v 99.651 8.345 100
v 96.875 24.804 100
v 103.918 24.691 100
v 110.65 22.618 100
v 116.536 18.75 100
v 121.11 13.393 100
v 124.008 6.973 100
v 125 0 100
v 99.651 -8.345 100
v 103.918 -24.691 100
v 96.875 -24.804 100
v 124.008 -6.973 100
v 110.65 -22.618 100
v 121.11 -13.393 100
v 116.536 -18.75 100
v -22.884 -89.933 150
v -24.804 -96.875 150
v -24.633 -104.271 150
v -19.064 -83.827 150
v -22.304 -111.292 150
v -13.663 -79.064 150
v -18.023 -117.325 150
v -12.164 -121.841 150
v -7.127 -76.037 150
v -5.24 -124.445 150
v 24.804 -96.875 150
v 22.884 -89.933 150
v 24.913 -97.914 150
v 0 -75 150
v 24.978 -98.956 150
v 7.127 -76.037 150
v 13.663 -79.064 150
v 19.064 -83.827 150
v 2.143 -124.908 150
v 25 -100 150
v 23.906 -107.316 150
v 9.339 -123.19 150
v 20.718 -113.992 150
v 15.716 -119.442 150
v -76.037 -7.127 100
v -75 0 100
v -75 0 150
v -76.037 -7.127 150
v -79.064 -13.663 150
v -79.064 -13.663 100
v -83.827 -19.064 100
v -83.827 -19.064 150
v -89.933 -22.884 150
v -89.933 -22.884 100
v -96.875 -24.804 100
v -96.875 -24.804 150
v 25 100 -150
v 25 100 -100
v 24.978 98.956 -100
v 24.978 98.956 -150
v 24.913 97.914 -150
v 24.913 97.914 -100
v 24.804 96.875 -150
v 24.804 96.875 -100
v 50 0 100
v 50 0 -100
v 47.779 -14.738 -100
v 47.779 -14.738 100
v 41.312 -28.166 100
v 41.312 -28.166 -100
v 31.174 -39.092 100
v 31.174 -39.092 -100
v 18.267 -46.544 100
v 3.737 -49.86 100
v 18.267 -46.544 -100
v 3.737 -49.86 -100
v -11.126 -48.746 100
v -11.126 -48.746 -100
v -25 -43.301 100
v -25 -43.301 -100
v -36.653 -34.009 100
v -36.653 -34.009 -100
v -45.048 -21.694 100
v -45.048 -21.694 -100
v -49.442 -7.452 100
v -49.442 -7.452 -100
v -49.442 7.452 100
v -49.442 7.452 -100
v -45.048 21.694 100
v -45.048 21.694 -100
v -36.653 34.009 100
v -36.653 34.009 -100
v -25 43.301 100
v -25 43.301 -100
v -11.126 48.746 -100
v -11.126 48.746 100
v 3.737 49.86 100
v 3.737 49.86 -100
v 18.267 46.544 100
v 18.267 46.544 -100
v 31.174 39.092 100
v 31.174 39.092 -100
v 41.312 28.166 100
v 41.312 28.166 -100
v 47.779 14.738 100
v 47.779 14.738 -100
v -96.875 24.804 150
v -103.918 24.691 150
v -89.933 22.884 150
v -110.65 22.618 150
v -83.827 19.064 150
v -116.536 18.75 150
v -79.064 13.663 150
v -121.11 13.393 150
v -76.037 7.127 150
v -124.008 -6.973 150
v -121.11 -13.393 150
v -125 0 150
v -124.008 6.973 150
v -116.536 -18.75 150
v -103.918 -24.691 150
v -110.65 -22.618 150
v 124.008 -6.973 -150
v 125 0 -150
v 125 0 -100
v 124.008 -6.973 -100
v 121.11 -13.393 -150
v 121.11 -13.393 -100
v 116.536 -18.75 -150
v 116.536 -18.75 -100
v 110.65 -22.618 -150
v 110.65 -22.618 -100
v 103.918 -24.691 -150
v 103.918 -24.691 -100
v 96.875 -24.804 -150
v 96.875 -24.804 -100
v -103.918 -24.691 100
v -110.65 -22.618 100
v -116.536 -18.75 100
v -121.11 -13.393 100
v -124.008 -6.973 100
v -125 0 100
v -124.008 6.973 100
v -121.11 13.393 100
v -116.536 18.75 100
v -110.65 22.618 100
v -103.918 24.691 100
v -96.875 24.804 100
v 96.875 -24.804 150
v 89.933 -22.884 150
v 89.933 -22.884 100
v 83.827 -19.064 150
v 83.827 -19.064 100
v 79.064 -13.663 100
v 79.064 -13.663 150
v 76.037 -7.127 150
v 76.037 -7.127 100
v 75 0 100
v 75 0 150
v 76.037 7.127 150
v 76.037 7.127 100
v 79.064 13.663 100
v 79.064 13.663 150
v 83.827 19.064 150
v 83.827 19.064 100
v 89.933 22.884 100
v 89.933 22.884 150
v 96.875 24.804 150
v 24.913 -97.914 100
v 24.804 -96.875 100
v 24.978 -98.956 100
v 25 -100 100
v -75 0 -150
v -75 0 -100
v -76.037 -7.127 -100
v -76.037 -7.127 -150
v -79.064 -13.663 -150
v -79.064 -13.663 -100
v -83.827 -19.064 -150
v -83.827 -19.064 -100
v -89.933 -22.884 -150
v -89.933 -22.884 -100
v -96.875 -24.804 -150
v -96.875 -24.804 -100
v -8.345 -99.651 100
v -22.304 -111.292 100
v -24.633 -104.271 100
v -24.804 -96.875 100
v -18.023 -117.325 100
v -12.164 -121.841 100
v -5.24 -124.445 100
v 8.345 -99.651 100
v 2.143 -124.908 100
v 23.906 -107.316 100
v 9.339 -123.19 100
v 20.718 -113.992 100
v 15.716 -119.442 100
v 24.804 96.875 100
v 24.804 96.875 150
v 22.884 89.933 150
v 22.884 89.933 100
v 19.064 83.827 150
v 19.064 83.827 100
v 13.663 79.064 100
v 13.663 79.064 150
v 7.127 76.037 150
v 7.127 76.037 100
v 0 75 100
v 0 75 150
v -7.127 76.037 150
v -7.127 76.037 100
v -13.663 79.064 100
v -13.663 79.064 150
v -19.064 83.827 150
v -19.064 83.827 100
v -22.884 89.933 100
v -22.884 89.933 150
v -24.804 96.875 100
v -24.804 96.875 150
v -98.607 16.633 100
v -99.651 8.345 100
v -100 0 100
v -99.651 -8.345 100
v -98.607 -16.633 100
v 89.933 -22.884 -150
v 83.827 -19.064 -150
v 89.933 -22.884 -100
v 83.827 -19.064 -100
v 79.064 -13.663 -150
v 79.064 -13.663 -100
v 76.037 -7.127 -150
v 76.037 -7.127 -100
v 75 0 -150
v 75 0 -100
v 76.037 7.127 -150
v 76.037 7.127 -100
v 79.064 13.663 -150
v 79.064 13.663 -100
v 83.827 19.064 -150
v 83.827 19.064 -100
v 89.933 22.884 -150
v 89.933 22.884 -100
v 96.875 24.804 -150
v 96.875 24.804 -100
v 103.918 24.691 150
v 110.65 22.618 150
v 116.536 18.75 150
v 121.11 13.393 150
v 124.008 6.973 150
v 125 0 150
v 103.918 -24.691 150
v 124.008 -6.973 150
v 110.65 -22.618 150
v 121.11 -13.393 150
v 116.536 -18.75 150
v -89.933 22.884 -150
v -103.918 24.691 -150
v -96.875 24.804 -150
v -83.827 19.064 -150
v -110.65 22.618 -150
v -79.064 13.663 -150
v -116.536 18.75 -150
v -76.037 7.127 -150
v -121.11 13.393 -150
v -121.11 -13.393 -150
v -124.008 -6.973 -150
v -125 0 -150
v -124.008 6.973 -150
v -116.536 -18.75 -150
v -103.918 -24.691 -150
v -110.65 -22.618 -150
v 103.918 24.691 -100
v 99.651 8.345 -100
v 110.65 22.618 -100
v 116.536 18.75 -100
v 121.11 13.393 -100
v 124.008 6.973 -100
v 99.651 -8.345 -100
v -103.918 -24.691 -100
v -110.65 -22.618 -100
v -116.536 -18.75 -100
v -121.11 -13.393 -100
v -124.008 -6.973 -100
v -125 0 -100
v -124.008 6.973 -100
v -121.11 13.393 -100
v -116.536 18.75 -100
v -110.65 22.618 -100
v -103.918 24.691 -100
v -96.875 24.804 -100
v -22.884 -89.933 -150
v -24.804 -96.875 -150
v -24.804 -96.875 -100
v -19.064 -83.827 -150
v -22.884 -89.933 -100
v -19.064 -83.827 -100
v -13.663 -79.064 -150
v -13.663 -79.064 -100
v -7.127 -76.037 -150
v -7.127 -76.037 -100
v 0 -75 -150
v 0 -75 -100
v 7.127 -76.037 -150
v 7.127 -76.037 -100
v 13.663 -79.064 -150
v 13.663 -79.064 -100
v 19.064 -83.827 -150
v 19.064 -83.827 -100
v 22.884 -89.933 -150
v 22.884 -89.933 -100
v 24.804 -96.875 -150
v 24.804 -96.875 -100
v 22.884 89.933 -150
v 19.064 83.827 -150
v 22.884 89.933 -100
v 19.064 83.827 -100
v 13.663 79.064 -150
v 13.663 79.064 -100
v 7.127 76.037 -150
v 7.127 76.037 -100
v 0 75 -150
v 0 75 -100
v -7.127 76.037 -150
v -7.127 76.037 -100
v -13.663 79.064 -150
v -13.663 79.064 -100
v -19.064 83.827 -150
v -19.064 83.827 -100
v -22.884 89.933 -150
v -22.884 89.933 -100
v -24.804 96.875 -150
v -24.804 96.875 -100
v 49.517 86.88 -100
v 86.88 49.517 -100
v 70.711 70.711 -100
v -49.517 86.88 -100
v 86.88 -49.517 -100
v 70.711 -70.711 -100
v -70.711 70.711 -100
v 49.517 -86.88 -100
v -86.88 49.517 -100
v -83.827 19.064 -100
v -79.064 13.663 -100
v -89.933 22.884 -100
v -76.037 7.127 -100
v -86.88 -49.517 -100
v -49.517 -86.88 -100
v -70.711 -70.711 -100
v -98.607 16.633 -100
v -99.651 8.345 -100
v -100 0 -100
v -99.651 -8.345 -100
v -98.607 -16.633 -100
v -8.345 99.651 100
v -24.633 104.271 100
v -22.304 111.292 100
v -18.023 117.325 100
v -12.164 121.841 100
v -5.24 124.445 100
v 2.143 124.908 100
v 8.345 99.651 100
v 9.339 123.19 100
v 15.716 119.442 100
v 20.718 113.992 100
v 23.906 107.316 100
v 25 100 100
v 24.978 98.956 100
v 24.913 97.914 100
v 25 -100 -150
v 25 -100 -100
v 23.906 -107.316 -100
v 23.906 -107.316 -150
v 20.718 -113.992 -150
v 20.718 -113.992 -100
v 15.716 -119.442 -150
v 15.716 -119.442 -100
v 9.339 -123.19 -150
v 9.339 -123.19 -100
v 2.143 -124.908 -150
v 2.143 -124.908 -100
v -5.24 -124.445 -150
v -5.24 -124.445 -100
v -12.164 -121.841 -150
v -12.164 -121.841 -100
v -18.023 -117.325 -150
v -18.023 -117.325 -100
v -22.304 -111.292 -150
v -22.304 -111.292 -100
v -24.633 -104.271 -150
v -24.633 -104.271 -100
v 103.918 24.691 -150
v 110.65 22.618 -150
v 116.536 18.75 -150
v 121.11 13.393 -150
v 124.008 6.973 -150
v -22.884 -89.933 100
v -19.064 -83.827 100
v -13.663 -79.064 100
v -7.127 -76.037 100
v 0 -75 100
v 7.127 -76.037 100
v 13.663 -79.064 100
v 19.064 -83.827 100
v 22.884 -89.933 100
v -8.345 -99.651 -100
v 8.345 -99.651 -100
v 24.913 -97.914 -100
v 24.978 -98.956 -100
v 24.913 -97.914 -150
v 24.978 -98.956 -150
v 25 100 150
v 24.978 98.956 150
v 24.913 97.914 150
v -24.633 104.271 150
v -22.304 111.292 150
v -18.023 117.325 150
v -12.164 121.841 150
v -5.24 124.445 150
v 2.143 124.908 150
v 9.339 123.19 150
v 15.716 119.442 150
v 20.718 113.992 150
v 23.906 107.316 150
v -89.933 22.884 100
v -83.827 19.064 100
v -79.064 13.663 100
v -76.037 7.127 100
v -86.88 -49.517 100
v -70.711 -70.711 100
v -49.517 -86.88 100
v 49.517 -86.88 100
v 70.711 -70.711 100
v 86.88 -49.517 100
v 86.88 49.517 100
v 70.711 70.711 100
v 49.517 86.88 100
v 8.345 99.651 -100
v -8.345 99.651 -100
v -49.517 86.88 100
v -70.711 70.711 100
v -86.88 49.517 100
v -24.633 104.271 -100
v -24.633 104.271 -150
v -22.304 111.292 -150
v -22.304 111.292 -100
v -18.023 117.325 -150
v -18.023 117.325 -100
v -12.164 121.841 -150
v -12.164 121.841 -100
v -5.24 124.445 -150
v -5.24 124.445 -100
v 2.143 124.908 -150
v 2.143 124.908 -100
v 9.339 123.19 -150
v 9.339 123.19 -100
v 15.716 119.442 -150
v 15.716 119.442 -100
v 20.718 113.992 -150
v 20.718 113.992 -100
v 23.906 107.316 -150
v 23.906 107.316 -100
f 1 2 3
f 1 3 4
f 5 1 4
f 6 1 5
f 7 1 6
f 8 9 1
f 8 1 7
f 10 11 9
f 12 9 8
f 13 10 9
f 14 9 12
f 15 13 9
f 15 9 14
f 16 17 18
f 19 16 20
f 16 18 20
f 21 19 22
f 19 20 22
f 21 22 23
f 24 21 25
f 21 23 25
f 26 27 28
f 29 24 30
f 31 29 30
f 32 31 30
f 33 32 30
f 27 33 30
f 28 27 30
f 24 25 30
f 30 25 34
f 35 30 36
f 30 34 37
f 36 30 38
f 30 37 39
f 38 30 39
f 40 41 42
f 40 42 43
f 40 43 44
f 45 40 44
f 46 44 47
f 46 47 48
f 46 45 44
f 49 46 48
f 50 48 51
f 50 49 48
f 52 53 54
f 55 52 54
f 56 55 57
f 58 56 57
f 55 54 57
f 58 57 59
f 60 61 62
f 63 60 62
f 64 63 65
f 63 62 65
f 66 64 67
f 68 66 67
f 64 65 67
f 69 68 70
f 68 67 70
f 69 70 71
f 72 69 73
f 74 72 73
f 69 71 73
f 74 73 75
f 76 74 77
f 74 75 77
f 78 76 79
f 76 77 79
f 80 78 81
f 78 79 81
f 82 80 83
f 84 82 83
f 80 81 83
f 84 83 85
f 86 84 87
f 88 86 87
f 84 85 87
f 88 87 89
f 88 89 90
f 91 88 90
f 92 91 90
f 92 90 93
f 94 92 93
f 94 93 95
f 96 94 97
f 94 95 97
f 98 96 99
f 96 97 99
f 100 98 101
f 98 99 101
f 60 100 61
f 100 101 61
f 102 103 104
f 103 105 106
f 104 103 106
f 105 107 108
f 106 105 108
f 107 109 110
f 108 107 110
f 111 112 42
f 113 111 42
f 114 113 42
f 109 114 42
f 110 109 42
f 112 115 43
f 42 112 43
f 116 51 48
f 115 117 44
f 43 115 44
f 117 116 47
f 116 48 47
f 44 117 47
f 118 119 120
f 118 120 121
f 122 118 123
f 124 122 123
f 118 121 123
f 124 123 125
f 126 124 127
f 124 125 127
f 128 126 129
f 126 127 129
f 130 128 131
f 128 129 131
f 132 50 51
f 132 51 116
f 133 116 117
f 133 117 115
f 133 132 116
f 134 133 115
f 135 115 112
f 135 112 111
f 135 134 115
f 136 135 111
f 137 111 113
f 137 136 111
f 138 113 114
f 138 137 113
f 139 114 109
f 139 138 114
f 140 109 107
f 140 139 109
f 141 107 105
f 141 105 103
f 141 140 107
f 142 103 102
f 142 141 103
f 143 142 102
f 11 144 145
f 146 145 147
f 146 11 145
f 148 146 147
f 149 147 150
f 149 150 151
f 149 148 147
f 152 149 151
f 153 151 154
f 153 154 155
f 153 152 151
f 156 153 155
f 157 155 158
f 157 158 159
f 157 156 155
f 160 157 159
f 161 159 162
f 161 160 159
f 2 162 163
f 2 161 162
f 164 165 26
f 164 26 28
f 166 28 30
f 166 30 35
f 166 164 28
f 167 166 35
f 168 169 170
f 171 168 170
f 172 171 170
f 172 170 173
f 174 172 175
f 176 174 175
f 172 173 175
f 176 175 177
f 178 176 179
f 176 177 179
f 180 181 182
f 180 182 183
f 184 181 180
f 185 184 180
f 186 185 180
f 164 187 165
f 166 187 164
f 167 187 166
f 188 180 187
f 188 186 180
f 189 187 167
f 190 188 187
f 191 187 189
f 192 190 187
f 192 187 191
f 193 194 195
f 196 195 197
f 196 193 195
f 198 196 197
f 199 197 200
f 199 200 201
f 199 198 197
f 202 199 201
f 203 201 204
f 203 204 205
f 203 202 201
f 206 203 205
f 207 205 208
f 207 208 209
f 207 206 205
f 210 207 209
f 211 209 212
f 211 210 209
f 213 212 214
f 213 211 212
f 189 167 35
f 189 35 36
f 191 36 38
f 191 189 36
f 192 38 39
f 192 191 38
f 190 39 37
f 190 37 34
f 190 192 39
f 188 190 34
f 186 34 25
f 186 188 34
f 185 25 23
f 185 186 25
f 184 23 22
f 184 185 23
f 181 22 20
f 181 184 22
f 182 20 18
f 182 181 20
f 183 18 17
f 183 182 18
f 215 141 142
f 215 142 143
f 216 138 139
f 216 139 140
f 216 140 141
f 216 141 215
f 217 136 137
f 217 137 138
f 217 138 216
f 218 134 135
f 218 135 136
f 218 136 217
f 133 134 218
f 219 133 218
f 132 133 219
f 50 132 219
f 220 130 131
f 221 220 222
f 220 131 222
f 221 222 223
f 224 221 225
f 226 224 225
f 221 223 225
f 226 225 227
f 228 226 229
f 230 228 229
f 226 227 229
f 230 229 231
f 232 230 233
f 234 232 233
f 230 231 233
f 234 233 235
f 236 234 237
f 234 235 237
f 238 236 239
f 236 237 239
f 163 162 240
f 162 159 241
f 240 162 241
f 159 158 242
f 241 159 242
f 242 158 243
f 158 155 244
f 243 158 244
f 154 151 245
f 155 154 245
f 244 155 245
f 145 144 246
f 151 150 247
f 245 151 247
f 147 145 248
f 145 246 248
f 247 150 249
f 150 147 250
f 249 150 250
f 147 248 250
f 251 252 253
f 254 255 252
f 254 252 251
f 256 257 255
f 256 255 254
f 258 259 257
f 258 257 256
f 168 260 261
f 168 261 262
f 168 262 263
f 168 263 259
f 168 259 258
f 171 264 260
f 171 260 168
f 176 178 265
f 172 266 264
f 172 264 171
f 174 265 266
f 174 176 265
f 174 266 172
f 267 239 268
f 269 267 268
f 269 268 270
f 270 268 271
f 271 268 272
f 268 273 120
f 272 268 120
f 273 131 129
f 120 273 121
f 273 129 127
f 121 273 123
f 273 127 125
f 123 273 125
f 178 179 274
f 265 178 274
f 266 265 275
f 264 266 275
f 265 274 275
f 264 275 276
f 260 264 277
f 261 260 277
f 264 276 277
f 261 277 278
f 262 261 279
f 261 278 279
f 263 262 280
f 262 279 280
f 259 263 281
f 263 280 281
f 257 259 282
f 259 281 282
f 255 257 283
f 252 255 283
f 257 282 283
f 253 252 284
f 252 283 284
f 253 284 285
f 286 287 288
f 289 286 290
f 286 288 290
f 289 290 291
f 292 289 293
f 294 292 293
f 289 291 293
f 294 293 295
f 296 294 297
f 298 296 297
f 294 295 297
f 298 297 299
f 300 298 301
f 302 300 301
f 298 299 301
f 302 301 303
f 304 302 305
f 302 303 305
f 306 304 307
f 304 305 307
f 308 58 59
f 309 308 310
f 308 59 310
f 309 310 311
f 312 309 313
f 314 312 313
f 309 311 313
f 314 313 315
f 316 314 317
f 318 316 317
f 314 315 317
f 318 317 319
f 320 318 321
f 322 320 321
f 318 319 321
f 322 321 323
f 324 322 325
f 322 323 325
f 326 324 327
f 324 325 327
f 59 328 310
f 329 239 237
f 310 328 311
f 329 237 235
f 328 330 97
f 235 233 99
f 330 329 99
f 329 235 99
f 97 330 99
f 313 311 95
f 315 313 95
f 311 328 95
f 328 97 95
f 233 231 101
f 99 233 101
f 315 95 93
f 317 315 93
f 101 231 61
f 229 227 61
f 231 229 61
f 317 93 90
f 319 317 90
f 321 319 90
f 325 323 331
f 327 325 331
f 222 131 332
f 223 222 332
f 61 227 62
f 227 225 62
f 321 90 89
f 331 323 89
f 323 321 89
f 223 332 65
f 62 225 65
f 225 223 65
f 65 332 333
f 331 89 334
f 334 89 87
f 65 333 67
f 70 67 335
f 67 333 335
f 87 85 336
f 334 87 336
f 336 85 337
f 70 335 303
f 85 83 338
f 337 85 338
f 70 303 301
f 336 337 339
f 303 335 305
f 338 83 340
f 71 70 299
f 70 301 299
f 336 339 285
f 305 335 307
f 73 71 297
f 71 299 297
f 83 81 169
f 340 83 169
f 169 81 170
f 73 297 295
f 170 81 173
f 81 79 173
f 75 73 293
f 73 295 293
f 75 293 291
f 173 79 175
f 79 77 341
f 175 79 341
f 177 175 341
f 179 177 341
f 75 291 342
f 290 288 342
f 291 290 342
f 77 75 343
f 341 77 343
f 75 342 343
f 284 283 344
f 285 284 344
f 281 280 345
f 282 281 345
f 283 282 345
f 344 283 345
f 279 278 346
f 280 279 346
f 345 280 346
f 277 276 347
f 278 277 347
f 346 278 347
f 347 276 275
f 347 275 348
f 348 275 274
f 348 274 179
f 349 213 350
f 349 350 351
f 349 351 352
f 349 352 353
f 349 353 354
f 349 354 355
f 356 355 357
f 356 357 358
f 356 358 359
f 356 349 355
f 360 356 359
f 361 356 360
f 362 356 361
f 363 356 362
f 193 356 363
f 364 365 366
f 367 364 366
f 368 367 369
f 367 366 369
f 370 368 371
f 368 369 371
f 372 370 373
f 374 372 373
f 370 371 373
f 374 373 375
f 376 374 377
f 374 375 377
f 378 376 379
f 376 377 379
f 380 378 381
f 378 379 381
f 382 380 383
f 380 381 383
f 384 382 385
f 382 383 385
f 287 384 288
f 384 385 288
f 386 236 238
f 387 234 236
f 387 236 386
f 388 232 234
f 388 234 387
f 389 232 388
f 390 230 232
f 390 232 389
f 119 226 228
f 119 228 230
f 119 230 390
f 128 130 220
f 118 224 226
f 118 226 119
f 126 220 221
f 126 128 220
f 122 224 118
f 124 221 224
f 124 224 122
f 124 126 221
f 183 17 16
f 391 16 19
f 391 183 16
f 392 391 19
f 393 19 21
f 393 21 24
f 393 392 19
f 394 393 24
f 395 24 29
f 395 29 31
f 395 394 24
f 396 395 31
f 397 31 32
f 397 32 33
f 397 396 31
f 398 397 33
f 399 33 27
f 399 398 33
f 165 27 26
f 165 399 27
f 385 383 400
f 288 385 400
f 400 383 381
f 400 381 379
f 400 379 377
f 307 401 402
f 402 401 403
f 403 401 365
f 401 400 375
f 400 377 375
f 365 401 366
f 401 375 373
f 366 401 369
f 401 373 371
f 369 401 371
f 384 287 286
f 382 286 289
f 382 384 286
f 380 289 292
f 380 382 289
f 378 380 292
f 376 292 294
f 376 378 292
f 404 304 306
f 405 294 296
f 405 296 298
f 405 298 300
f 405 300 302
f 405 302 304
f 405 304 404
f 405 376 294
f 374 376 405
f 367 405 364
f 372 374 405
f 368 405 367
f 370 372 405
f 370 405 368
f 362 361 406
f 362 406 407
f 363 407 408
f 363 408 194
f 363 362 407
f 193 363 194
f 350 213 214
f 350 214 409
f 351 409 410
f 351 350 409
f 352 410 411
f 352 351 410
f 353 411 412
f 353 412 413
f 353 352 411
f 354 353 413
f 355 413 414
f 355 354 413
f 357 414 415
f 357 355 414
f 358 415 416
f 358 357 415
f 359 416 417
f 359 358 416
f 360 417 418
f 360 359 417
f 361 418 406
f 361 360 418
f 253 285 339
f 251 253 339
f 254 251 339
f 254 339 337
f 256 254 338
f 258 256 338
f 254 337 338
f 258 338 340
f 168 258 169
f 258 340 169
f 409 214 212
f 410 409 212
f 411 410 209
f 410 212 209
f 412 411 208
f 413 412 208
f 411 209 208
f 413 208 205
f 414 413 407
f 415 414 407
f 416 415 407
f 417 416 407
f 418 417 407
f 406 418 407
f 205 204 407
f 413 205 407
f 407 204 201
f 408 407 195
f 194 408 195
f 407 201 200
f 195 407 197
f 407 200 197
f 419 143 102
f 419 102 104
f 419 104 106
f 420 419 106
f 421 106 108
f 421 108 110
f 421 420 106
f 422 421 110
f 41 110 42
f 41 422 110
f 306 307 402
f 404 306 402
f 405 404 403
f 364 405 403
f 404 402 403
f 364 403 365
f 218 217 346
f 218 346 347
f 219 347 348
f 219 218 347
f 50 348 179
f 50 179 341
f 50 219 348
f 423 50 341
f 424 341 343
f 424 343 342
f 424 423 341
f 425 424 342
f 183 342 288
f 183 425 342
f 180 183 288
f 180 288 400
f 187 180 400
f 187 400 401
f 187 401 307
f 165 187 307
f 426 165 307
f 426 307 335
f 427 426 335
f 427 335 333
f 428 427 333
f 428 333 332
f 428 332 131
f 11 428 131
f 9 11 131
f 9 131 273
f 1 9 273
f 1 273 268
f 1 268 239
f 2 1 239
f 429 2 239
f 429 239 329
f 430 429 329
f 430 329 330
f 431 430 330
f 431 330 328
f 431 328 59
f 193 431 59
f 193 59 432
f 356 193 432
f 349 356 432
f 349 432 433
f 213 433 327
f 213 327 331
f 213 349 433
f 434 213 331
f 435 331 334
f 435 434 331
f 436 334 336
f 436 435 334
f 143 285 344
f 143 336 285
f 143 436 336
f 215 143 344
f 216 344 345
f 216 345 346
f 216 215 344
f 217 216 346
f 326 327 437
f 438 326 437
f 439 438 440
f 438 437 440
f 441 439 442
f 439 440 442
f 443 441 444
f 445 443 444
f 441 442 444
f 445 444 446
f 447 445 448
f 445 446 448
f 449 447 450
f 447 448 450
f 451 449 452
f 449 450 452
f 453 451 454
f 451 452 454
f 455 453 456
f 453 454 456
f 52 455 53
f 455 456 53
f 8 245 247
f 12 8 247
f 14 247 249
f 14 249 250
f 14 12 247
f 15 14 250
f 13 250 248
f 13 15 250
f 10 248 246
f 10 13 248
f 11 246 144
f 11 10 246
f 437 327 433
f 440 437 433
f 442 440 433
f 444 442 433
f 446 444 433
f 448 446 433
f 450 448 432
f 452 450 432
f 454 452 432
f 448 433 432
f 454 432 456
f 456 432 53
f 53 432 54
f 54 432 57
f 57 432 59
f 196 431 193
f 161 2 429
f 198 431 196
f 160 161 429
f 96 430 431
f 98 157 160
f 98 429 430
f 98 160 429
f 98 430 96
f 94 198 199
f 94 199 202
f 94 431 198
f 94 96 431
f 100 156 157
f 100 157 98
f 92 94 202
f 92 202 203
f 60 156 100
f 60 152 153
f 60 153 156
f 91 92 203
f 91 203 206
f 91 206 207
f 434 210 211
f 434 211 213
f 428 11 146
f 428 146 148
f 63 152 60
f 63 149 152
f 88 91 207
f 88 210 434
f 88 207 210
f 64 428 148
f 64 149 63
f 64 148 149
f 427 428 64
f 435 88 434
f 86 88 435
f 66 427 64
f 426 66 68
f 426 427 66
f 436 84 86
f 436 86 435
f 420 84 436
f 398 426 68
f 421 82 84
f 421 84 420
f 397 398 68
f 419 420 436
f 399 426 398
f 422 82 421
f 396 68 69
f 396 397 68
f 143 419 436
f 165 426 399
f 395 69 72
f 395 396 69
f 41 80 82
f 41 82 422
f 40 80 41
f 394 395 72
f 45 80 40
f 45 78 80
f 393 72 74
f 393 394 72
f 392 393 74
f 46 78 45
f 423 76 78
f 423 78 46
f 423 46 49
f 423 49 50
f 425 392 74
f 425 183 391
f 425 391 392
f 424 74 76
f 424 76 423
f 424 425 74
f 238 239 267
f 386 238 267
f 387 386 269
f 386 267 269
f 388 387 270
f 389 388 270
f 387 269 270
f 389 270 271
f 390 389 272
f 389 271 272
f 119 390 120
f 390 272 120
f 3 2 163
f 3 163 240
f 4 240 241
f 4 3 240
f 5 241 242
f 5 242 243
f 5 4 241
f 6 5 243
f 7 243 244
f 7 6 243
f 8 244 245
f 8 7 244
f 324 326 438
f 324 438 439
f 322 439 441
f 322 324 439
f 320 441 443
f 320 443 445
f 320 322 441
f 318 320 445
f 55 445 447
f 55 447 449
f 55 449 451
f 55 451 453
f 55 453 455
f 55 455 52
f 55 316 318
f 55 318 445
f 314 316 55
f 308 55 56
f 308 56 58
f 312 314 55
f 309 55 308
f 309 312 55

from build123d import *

# Parameters (mm, degrees)
F0_W     = 100
F0_H     = 200
F2_R     = 50
F3_DEPTH = 200
F5_DEPTH = 50


with BuildPart() as f1:
    # F0 (on Front) → F1 (revolve)
    with BuildSketch(Plane.XZ):
        with Locations((-50, 0)):
            Rectangle(F0_W, F0_H)
    revolve(axis=Axis((0, 0, 0), (0, 0, 1)))

    # F2 (on face) → F3 (cut)
    with BuildSketch(Plane(origin=(0, 0, -100), x_dir=(1, 0, 0), z_dir=(0, 0, -1))):
        Circle(F2_R)
    extrude(amount=-F3_DEPTH, mode=Mode.SUBTRACT)

    # F4 (on face) → F5 (join)
    with BuildSketch(Plane(origin=(0, 0, -100), x_dir=(1, 0, 0), z_dir=(0, 0, -1))):
        with BuildLine():
            ThreePointArc((-96.875, 24.803919), (-100, 0), (-96.875, -24.803919))
            ThreePointArc((-96.875, -24.803919), (-81.25, -16.535946), (-75, 0))
            ThreePointArc((-75, 0), (-81.25, 16.535946), (-96.875, 24.803919))
        make_face()
        with BuildLine():
            ThreePointArc((-96.875, 24.803919), (-125, 0), (-96.875, -24.803919))
            ThreePointArc((-96.875, -24.803919), (-100, 0), (-96.875, 24.803919))
        make_face()
        with BuildLine():
            ThreePointArc((-24.803919, -96.875), (-1.565573, -124.950931), (25, -100))
            ThreePointArc((25, -100), (24.950931, -98.434427), (24.803919, -96.875))
            ThreePointArc((24.803919, -96.875), (0, -100), (-24.803919, -96.875))
        make_face()
        with BuildLine():
            ThreePointArc((-24.803919, -96.875), (0, -100), (24.803919, -96.875))
            ThreePointArc((24.803919, -96.875), (0, -75), (-24.803919, -96.875))
        make_face()
        with BuildLine():
            ThreePointArc((-24.803919, 96.875), (0, 100), (24.803919, 96.875))
            ThreePointArc((24.803919, 96.875), (24.950931, 98.434427), (25, 100))
            ThreePointArc((25, 100), (-1.565573, 124.950931), (-24.803919, 96.875))
        make_face()
        with BuildLine():
            ThreePointArc((-24.803919, 96.875), (0, 75), (24.803919, 96.875))
            ThreePointArc((24.803919, 96.875), (0, 100), (-24.803919, 96.875))
        make_face()
        with BuildLine():
            ThreePointArc((100, 0), (99.215674, -12.5), (96.875, -24.803919))
            ThreePointArc((96.875, -24.803919), (116.535946, -18.75), (125, 0))
            ThreePointArc((125, 0), (116.535946, 18.75), (96.875, 24.803919))
            ThreePointArc((96.875, 24.803919), (99.215674, 12.5), (100, 0))
        make_face()
        with BuildLine():
            ThreePointArc((96.875, 24.803919), (75, 0), (96.875, -24.803919))
            ThreePointArc((96.875, -24.803919), (99.215674, -12.5), (100, 0))
            ThreePointArc((100, 0), (99.215674, 12.5), (96.875, 24.803919))
        make_face()
    extrude(amount=F5_DEPTH)

    # F6: F1 across plane


with BuildPart() as f1_1:
    add(f1.part)
    add(f1.part.mirror(Plane.XY))


solid = f1_1.part
